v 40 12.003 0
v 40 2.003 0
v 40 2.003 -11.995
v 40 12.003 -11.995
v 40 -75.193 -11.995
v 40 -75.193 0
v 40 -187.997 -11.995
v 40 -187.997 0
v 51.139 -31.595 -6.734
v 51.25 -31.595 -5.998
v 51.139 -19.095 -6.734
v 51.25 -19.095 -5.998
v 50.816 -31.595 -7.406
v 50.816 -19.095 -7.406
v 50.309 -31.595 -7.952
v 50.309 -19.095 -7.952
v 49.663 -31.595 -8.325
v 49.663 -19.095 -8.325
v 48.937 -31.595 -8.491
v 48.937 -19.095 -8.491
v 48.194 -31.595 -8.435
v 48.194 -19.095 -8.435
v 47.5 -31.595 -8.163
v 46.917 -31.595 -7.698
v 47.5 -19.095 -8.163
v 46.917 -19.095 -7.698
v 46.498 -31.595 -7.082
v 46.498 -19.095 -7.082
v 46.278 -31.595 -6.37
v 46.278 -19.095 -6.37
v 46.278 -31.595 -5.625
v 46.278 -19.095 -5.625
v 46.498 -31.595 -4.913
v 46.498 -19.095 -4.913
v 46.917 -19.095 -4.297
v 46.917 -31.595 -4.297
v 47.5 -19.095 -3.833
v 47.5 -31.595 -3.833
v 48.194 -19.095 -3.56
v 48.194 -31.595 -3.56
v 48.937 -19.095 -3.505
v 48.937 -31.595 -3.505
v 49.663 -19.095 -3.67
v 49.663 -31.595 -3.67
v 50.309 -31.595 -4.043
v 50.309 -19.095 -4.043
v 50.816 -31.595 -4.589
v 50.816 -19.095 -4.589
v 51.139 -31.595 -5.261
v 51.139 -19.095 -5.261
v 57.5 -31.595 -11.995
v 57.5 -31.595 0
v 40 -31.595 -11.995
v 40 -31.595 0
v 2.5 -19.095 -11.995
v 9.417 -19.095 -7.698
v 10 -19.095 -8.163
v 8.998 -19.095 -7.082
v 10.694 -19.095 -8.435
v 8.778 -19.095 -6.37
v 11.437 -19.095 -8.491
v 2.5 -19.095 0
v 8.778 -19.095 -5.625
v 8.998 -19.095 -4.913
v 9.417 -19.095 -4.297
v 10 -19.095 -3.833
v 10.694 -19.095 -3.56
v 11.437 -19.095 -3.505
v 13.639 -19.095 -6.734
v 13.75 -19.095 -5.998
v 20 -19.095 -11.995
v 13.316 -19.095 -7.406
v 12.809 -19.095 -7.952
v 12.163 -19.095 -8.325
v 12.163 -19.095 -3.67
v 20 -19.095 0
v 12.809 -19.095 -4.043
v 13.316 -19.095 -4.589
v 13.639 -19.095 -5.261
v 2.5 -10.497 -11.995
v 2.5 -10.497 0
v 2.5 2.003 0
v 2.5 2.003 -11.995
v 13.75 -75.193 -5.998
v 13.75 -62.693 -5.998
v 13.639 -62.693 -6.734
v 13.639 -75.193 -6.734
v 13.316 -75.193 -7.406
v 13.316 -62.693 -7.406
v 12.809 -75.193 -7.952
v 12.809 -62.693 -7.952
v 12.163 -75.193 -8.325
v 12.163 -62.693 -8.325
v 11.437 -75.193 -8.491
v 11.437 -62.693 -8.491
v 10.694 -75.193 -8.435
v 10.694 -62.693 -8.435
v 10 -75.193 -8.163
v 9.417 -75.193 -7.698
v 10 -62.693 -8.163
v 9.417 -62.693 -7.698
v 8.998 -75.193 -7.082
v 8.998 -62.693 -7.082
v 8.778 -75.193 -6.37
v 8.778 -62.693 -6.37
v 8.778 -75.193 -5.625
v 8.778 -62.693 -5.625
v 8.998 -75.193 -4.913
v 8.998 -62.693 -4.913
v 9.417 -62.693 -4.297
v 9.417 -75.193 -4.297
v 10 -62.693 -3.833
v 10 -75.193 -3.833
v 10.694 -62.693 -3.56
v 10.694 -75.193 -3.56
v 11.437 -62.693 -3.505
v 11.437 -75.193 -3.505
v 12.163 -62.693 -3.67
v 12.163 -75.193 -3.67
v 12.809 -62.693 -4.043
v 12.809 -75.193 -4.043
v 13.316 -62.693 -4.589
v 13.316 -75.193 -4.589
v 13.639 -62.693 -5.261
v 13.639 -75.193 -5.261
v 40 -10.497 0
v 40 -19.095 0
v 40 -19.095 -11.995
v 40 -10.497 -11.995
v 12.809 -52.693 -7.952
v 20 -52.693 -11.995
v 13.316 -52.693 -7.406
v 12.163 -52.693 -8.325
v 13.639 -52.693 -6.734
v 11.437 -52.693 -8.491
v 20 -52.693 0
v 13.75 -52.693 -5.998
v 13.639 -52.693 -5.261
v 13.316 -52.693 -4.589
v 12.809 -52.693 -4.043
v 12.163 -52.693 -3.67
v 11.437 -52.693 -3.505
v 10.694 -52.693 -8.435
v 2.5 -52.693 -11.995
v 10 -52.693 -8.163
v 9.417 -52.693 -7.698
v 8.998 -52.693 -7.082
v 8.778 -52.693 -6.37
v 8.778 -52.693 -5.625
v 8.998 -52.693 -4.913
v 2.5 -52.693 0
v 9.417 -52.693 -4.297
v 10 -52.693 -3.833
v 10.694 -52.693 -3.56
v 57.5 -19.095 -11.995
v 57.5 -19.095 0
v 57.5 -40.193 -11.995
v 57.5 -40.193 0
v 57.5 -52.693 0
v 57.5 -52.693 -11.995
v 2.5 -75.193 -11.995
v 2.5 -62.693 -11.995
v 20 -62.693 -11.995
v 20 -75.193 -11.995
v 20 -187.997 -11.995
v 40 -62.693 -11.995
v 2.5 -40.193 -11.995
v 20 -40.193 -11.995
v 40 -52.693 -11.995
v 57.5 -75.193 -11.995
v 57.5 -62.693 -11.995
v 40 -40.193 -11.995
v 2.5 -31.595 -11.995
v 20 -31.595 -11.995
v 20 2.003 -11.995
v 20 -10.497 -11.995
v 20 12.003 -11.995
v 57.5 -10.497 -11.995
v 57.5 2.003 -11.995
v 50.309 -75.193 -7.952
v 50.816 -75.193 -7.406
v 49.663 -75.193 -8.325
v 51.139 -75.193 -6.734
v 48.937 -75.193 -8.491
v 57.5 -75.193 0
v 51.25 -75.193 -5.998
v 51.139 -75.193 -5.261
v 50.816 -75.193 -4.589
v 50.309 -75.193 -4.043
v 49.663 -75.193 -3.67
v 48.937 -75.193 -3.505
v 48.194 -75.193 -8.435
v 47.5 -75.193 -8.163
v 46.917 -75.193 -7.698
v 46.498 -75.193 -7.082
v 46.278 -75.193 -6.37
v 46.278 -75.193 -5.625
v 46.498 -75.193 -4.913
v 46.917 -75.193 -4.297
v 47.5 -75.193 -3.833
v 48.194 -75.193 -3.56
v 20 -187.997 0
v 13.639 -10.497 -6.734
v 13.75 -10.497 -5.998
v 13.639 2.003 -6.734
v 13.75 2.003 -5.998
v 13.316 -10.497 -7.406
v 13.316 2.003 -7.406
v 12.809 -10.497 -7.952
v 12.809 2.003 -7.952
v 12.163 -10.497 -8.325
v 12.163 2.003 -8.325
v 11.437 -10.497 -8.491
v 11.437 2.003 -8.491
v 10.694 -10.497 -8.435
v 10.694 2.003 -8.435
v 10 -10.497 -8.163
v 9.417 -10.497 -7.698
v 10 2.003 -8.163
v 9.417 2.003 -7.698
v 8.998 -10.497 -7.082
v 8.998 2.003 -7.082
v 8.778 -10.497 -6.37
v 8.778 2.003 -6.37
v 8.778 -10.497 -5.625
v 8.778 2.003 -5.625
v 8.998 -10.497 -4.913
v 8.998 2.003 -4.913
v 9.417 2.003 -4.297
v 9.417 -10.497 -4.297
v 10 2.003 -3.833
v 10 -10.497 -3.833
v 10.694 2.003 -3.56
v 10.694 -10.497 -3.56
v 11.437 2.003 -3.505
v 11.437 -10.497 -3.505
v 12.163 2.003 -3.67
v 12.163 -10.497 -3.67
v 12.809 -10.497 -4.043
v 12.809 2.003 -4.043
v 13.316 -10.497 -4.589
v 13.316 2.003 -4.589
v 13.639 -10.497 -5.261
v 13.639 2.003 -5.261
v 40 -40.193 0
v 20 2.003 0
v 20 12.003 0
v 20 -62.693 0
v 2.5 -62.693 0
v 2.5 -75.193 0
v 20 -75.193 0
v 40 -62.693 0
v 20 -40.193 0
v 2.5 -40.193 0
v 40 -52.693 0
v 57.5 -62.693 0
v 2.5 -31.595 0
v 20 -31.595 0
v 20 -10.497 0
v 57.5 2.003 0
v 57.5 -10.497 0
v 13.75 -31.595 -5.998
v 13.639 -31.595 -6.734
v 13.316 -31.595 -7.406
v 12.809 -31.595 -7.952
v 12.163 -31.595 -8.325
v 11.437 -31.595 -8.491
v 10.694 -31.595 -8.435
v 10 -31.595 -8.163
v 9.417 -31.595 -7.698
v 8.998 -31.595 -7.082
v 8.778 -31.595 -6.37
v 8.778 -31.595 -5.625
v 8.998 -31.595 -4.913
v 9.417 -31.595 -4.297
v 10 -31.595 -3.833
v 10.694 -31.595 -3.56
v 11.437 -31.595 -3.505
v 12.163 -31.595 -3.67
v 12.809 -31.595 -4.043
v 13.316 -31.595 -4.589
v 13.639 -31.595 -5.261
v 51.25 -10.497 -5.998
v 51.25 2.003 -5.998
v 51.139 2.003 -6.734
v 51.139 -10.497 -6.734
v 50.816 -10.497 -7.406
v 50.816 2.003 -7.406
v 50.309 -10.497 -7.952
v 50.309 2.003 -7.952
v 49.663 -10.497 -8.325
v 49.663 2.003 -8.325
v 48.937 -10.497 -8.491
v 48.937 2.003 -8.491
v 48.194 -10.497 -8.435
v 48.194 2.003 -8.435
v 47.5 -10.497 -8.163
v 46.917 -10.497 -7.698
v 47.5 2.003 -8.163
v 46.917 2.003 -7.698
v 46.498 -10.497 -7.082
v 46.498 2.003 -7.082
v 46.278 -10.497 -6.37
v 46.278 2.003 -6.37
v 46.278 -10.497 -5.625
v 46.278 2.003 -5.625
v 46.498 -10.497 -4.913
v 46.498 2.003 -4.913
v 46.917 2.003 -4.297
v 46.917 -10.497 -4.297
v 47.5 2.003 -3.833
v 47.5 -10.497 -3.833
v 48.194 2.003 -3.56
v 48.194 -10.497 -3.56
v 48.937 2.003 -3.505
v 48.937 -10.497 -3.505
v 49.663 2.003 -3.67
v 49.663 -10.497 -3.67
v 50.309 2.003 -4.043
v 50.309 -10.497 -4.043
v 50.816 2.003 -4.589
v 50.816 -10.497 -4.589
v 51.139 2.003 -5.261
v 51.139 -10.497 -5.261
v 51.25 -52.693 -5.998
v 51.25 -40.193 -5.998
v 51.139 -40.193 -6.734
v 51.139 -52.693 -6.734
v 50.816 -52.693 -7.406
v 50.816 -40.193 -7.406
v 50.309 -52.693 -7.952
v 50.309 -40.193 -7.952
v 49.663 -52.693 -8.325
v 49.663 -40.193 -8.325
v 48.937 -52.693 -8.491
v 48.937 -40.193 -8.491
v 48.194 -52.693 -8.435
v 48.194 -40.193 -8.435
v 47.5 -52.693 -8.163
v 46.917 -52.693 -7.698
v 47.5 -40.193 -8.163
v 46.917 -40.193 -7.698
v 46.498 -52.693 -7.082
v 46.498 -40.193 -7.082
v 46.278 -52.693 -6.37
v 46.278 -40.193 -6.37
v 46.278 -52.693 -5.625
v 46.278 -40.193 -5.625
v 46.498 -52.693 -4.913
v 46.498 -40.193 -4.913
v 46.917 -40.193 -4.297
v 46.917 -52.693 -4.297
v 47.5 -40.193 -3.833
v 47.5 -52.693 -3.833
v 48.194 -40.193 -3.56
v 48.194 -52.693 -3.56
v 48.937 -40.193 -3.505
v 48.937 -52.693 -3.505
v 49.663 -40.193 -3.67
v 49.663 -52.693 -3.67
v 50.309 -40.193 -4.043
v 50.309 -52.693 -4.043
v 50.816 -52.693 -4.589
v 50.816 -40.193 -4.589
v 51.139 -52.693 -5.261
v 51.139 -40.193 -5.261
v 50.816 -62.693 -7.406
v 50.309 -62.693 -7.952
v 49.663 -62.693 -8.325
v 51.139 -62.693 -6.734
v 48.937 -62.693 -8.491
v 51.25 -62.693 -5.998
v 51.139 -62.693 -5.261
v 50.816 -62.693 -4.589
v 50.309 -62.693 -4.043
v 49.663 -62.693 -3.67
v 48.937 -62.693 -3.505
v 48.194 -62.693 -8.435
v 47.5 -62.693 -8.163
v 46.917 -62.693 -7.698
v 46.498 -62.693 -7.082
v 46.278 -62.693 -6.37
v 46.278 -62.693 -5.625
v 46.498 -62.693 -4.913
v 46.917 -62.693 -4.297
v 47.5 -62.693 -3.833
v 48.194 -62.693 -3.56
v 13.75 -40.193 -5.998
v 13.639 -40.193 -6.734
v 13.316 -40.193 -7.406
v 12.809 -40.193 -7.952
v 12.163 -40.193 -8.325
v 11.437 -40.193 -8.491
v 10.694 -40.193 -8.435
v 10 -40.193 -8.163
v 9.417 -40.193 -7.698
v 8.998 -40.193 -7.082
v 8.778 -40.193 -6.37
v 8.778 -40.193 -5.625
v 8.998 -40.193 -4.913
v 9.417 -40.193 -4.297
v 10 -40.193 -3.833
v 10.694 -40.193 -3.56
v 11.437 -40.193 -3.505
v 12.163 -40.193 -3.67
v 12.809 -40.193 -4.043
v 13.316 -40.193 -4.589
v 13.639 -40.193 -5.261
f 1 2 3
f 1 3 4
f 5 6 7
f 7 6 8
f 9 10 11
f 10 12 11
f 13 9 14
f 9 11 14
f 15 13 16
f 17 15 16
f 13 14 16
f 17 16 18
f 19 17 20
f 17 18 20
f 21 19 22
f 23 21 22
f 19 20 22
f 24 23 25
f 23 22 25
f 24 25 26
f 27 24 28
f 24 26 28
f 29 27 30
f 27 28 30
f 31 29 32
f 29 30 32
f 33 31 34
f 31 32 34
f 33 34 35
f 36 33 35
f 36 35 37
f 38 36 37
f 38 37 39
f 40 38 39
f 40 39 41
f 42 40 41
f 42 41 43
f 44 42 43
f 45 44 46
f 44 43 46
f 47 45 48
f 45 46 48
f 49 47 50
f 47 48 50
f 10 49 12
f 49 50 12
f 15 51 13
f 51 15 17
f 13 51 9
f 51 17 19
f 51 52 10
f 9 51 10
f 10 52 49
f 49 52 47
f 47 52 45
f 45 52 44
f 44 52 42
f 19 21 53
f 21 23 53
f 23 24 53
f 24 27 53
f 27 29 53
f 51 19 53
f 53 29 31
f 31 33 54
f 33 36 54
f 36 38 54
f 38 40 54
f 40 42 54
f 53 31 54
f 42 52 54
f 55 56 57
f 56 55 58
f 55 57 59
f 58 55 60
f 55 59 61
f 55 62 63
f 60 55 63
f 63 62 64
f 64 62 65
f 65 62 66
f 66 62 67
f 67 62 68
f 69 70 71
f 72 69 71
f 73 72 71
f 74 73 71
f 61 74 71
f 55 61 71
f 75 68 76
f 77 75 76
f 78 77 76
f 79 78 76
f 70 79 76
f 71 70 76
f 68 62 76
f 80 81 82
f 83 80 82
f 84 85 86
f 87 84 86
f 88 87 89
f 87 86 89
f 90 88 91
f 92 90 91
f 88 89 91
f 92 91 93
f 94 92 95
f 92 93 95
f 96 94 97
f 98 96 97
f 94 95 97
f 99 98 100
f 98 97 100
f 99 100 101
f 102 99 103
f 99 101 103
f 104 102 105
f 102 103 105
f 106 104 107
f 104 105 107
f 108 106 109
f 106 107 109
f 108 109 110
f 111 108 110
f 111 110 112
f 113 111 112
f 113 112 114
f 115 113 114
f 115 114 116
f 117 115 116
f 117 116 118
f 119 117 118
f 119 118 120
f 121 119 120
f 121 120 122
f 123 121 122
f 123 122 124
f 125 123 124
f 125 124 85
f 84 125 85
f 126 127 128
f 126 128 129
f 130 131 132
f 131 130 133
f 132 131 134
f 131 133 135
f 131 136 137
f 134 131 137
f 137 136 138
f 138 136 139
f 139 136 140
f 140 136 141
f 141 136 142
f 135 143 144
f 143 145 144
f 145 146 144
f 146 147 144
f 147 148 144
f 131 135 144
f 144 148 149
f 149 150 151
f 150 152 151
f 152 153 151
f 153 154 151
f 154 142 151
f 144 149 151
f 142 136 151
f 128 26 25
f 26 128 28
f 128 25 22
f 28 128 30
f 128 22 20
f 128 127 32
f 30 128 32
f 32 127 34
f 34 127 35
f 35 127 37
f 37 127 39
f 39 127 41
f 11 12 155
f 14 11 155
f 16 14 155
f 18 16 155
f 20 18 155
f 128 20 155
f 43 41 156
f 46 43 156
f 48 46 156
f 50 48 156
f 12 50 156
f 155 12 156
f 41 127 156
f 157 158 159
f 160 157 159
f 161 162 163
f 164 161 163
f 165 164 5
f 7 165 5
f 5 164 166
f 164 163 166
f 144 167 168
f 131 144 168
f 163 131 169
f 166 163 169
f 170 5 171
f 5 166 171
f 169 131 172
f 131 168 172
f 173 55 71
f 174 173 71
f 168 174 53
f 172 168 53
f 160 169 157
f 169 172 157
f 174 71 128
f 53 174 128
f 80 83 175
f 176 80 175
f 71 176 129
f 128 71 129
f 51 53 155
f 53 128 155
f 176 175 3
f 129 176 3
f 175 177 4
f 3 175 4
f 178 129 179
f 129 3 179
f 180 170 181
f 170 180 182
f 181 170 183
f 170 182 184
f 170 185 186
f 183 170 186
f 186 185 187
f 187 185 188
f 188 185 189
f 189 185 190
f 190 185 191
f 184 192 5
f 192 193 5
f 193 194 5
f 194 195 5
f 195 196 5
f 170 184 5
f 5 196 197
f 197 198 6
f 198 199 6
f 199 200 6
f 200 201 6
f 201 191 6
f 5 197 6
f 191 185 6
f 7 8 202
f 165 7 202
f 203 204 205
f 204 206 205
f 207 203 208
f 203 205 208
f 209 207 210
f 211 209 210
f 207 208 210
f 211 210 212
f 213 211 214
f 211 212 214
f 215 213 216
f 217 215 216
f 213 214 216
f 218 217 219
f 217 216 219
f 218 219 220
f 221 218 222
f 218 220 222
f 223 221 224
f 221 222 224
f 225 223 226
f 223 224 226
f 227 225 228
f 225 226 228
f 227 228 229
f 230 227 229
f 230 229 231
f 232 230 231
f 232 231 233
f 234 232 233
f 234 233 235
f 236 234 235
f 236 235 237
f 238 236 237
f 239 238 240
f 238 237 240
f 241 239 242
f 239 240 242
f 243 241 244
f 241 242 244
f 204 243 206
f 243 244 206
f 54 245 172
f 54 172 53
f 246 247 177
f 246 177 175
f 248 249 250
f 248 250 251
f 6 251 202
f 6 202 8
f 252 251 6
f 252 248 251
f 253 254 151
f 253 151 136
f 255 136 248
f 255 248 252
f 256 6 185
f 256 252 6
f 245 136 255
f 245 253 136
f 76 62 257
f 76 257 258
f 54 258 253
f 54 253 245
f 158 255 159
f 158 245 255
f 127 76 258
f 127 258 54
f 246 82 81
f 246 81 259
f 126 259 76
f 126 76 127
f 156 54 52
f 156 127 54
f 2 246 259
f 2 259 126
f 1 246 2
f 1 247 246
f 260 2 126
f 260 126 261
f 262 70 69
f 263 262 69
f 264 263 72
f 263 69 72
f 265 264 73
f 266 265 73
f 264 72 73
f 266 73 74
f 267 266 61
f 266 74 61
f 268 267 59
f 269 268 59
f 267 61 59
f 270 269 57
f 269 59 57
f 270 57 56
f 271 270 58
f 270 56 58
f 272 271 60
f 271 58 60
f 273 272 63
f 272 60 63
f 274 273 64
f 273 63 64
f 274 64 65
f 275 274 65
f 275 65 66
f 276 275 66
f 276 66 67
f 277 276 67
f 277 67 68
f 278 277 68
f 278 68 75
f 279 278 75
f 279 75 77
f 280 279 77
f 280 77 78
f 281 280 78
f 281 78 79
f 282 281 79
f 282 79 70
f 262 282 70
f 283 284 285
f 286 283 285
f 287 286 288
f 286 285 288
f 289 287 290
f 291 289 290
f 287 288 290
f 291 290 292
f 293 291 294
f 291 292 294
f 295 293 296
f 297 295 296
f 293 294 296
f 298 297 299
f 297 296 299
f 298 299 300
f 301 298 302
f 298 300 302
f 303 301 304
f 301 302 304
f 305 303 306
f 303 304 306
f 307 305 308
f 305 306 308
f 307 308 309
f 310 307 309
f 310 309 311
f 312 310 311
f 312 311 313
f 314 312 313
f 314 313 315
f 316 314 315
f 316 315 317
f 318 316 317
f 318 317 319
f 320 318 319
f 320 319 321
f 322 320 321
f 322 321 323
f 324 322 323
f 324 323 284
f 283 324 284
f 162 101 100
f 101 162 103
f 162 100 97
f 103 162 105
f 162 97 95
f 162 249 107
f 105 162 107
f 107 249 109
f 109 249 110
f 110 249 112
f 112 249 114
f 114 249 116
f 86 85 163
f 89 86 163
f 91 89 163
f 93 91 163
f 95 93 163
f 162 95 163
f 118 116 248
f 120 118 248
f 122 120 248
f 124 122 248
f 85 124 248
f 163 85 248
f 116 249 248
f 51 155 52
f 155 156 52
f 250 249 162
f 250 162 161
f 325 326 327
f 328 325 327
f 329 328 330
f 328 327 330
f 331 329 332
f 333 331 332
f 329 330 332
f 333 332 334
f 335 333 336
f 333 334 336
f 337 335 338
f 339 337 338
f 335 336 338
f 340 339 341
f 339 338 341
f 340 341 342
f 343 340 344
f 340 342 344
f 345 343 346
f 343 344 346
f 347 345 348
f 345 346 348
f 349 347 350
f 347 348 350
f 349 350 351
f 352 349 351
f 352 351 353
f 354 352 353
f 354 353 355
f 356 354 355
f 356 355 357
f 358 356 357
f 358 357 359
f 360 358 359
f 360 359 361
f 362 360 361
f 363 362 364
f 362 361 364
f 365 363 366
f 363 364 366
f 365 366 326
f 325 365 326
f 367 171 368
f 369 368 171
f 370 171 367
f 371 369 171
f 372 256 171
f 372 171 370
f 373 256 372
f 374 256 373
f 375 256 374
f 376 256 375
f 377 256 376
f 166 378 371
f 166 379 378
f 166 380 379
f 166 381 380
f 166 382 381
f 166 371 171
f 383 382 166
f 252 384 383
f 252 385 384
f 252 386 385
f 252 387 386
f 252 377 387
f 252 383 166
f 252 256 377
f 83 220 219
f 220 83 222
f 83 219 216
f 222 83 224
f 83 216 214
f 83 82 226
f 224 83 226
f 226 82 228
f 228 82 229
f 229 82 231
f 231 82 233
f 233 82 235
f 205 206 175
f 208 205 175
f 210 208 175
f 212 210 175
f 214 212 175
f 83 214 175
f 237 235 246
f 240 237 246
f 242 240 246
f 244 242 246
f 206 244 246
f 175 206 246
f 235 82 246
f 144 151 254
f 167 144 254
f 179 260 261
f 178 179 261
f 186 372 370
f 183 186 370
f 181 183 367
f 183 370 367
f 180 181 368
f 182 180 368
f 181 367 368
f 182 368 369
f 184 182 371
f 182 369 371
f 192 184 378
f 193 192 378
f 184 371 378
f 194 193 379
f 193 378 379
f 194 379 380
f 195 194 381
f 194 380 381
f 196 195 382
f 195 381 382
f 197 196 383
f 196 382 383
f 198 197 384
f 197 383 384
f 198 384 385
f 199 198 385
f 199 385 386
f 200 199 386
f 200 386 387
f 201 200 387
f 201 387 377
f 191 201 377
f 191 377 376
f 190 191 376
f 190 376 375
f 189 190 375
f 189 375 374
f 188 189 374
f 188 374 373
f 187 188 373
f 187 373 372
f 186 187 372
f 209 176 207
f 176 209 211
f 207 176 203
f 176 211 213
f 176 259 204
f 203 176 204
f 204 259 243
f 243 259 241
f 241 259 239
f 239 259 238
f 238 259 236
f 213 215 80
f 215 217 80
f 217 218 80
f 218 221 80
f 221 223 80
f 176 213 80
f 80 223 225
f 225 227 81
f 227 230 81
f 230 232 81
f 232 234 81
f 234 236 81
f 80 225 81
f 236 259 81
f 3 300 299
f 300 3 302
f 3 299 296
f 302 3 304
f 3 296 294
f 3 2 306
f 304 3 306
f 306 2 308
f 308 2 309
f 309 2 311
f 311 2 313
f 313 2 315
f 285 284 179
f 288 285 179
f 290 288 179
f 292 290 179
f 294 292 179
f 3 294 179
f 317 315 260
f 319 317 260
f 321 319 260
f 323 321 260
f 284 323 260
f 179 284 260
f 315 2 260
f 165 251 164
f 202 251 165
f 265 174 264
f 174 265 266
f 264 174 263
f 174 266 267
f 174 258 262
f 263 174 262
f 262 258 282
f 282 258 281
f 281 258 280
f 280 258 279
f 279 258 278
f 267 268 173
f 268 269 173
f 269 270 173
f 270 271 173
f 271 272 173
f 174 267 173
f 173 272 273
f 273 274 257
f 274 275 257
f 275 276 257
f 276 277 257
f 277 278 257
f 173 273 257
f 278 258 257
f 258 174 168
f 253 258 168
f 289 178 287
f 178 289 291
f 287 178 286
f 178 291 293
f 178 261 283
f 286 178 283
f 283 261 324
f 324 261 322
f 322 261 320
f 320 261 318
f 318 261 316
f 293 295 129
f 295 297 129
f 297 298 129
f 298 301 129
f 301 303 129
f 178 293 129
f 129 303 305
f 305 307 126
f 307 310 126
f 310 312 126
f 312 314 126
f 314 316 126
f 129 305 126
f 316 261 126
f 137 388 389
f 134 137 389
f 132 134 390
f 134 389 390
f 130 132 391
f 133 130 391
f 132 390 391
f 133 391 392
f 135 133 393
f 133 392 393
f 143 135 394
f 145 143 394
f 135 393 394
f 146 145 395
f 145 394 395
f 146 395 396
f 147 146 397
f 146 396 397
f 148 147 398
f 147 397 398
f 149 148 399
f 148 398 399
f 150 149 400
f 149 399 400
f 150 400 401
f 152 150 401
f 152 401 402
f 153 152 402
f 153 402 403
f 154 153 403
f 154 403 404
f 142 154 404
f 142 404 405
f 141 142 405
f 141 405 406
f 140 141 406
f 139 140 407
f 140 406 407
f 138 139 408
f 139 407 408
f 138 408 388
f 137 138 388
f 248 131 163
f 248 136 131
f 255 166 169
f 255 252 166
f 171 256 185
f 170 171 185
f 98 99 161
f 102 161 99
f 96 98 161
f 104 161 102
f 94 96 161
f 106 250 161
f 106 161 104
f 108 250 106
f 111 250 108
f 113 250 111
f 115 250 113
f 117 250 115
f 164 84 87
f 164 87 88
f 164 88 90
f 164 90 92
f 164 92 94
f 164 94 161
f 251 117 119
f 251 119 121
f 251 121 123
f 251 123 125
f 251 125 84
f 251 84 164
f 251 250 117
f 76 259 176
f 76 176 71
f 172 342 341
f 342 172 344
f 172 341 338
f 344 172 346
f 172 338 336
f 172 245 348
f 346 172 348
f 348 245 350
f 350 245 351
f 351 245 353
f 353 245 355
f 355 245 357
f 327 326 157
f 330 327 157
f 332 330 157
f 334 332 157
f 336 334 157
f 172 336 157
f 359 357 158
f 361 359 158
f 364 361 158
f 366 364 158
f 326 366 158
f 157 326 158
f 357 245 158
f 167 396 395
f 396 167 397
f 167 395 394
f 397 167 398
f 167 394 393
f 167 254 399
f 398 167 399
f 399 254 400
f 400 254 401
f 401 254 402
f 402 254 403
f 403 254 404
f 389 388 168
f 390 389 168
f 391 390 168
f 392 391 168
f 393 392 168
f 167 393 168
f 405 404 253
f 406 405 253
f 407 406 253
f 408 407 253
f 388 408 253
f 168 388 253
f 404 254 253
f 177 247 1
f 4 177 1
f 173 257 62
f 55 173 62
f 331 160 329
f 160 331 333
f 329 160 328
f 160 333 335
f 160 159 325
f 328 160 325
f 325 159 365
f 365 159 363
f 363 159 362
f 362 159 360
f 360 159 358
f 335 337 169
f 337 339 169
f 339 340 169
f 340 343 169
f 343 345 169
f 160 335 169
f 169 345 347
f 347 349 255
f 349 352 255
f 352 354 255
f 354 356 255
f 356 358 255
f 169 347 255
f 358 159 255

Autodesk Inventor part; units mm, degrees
ref_plane "YZ Plane" through (0, 0, 0) normal (1, 0, 0) x (0, 1, 0)
ref_plane "XZ Plane" through (0, 0, 0) normal (0, 1, 0) x (-1, 0, 0)
ref_plane "Work Plane1" through (40, -59.8973, -11.9951) normal (0, 0, -1) x (0, 1, 0)
sketch "Sketch1" plane through (0, 0, 0) normal (0, 0, 1) x (1, 0, 0)
  line L0 (2.5, -40.193) -> (20, -40.193) projected
  line L1 (20, -31.5948) -> (20, -40.193) projected
  line L2 (20, -31.5948) -> (2.5, -31.5948) projected
  line L3 (2.5, -31.5948) -> (2.5, -19.0948) projected
  line L4 (2.5, -19.0948) -> (20, -19.0948) projected
  line L5 (20, -10.4966) -> (20, -19.0948) projected
  line L6 (20, -10.4966) -> (2.5, -10.4966) projected
  line L7 (2.5, -10.4966) -> (2.5, 2.0034) projected
  line L8 (2.5, 2.0034) -> (20, 2.0034) projected
  line L9 (20, 12.0034) -> (20, 2.0034) projected
  line L10 (-7.708, 12.0034) -> (20, 12.0034) projected
  line L11 (-7.708, -62.693) -> (-7.708, 12.0034) projected
  line L12 (-7.708, -62.693) -> (20, -62.693) projected
  line L13 (20, -52.693) -> (20, -62.693) projected
  line L14 (20, -52.693) -> (2.5, -52.693) projected
  line L15 (2.5, -52.693) -> (2.5, -40.193) projected
  line L16 (57.5, -10.4966) -> (40, -10.4966) projected
  line L17 (40, -19.0948) -> (40, -10.4966) projected
  line L18 (40, -19.0948) -> (57.5, -19.0948) projected
  line L19 (57.5, -19.0948) -> (57.5, -31.5948) projected
  line L20 (57.5, -31.5948) -> (40, -31.5948) projected
  line L21 (40, -40.193) -> (40, -31.5948) projected
  line L22 (40, -40.193) -> (57.5, -40.193) projected
  line L23 (57.5, -40.193) -> (57.5, -52.693) projected
  line L24 (57.5, -52.693) -> (40, -52.693) projected
  line L25 (40, -62.693) -> (40, -52.693) projected
  line L26 (67.708, -62.693) -> (40, -62.693) projected
  line L27 (67.708, 12.0034) -> (67.708, -62.693) projected
  line L28 (67.708, 12.0034) -> (40, 12.0034) projected
  line L29 (40, 2.0034) -> (40, 12.0034) projected
  line L30 (40, 2.0034) -> (57.5, 2.0034) projected
  line L31 (57.5, 2.0034) -> (57.5, -10.4966) projected
  line L32 (20, 12.0034) -> (40, 12.0034)
  line L33 (40, -187.9966) -> (20, -187.9966)
  line L34 (57.5, -62.693) -> (57.5, -75.193)
  line L35 (57.5, -75.193) -> (40, -75.193)
  line L36 (40, -75.193) -> (40, -187.9966)
  line L37 (2.5, -62.693) -> (2.5, -75.193)
  line L38 (2.5, -75.193) -> (20, -75.193)
  line L39 (20, -75.193) -> (20, -187.9966)
  point P0 (0, 0)
  dimension "d0" = 200
  dimension "d1" = 17.5
  dimension "d2" = 17.5
  dimension "d3" = 12.5
extrude "Extrusion1" add sketch "Sketch1" against normal up to surface (11.9951 mm away) contours L0 L1 L2 L3 L4 L5 L6 L7 L8 L9 L32 L29 L30 L31 L16 L17 L18 L19 L20 L21 L22 L23 L24 L25 L26 L34 L35 L36 L33 L39 L38 L37 L12 L13 L14 L15
sketch "Sketch2" plane through (2.5, -75.193, 0) normal (0, -1, 0) x (1, 0, 0)
  line L0 (0, -11.9951) -> (17.5, -11.9951) projected
  line L1 (17.5, 0) -> (17.5, -11.9951) projected
  line L2 (0, 0) -> (17.5, 0) projected
  line L3 (0, 0) -> (0, -11.9951) projected
  line L4 (0, 0) -> (17.5, 0) projected
  line L5 (17.5, 0) -> (17.5, -11.9951) projected
  line L6 (0, 0) -> (17.5, -11.9951)
  circle A0 centre (10, -6.6174) radius 3.3205
  point P0 (-2.5, 0)
sketch "Sketch3" plane through (2.5, 2.0034, 0) normal (0, 1, 0) x (1, 0, 0)
  circle A0 centre (8.75, 5.9976) radius 2.5 projected
  circle A1 centre (8.75, 5.9976) radius 2.5 projected
  line L0 (0, 0) -> (17.5, 0) projected
  line L1 (17.5, 0) -> (17.5, 11.9951) construction
  line L2 (0, 0) -> (17.5, 11.9951) construction
  line L3 (17.5, 11.9951) -> (0, 11.9951) construction
  line L4 (0, 11.9951) -> (17.5, 0) construction
  line L5 (37.5, 0) -> (37.5, 11.9951) construction
  line L6 (37.5, 11.9951) -> (55, 11.9951) construction
  line L7 (37.5, 0) -> (55, 11.9951) construction
  line L8 (55, 11.9951) -> (37.5, 11.9951) construction
  line L9 (37.5, 11.9951) -> (55, 0) construction
  circle A2 centre (46.25, 5.9976) radius 2.5
  point P0 (-2.5, 0)
  dimension "d7" = 5
extrude "Extrusion2" cut sketch "Sketch3" against normal blind 86.2
properties part number "Center"
